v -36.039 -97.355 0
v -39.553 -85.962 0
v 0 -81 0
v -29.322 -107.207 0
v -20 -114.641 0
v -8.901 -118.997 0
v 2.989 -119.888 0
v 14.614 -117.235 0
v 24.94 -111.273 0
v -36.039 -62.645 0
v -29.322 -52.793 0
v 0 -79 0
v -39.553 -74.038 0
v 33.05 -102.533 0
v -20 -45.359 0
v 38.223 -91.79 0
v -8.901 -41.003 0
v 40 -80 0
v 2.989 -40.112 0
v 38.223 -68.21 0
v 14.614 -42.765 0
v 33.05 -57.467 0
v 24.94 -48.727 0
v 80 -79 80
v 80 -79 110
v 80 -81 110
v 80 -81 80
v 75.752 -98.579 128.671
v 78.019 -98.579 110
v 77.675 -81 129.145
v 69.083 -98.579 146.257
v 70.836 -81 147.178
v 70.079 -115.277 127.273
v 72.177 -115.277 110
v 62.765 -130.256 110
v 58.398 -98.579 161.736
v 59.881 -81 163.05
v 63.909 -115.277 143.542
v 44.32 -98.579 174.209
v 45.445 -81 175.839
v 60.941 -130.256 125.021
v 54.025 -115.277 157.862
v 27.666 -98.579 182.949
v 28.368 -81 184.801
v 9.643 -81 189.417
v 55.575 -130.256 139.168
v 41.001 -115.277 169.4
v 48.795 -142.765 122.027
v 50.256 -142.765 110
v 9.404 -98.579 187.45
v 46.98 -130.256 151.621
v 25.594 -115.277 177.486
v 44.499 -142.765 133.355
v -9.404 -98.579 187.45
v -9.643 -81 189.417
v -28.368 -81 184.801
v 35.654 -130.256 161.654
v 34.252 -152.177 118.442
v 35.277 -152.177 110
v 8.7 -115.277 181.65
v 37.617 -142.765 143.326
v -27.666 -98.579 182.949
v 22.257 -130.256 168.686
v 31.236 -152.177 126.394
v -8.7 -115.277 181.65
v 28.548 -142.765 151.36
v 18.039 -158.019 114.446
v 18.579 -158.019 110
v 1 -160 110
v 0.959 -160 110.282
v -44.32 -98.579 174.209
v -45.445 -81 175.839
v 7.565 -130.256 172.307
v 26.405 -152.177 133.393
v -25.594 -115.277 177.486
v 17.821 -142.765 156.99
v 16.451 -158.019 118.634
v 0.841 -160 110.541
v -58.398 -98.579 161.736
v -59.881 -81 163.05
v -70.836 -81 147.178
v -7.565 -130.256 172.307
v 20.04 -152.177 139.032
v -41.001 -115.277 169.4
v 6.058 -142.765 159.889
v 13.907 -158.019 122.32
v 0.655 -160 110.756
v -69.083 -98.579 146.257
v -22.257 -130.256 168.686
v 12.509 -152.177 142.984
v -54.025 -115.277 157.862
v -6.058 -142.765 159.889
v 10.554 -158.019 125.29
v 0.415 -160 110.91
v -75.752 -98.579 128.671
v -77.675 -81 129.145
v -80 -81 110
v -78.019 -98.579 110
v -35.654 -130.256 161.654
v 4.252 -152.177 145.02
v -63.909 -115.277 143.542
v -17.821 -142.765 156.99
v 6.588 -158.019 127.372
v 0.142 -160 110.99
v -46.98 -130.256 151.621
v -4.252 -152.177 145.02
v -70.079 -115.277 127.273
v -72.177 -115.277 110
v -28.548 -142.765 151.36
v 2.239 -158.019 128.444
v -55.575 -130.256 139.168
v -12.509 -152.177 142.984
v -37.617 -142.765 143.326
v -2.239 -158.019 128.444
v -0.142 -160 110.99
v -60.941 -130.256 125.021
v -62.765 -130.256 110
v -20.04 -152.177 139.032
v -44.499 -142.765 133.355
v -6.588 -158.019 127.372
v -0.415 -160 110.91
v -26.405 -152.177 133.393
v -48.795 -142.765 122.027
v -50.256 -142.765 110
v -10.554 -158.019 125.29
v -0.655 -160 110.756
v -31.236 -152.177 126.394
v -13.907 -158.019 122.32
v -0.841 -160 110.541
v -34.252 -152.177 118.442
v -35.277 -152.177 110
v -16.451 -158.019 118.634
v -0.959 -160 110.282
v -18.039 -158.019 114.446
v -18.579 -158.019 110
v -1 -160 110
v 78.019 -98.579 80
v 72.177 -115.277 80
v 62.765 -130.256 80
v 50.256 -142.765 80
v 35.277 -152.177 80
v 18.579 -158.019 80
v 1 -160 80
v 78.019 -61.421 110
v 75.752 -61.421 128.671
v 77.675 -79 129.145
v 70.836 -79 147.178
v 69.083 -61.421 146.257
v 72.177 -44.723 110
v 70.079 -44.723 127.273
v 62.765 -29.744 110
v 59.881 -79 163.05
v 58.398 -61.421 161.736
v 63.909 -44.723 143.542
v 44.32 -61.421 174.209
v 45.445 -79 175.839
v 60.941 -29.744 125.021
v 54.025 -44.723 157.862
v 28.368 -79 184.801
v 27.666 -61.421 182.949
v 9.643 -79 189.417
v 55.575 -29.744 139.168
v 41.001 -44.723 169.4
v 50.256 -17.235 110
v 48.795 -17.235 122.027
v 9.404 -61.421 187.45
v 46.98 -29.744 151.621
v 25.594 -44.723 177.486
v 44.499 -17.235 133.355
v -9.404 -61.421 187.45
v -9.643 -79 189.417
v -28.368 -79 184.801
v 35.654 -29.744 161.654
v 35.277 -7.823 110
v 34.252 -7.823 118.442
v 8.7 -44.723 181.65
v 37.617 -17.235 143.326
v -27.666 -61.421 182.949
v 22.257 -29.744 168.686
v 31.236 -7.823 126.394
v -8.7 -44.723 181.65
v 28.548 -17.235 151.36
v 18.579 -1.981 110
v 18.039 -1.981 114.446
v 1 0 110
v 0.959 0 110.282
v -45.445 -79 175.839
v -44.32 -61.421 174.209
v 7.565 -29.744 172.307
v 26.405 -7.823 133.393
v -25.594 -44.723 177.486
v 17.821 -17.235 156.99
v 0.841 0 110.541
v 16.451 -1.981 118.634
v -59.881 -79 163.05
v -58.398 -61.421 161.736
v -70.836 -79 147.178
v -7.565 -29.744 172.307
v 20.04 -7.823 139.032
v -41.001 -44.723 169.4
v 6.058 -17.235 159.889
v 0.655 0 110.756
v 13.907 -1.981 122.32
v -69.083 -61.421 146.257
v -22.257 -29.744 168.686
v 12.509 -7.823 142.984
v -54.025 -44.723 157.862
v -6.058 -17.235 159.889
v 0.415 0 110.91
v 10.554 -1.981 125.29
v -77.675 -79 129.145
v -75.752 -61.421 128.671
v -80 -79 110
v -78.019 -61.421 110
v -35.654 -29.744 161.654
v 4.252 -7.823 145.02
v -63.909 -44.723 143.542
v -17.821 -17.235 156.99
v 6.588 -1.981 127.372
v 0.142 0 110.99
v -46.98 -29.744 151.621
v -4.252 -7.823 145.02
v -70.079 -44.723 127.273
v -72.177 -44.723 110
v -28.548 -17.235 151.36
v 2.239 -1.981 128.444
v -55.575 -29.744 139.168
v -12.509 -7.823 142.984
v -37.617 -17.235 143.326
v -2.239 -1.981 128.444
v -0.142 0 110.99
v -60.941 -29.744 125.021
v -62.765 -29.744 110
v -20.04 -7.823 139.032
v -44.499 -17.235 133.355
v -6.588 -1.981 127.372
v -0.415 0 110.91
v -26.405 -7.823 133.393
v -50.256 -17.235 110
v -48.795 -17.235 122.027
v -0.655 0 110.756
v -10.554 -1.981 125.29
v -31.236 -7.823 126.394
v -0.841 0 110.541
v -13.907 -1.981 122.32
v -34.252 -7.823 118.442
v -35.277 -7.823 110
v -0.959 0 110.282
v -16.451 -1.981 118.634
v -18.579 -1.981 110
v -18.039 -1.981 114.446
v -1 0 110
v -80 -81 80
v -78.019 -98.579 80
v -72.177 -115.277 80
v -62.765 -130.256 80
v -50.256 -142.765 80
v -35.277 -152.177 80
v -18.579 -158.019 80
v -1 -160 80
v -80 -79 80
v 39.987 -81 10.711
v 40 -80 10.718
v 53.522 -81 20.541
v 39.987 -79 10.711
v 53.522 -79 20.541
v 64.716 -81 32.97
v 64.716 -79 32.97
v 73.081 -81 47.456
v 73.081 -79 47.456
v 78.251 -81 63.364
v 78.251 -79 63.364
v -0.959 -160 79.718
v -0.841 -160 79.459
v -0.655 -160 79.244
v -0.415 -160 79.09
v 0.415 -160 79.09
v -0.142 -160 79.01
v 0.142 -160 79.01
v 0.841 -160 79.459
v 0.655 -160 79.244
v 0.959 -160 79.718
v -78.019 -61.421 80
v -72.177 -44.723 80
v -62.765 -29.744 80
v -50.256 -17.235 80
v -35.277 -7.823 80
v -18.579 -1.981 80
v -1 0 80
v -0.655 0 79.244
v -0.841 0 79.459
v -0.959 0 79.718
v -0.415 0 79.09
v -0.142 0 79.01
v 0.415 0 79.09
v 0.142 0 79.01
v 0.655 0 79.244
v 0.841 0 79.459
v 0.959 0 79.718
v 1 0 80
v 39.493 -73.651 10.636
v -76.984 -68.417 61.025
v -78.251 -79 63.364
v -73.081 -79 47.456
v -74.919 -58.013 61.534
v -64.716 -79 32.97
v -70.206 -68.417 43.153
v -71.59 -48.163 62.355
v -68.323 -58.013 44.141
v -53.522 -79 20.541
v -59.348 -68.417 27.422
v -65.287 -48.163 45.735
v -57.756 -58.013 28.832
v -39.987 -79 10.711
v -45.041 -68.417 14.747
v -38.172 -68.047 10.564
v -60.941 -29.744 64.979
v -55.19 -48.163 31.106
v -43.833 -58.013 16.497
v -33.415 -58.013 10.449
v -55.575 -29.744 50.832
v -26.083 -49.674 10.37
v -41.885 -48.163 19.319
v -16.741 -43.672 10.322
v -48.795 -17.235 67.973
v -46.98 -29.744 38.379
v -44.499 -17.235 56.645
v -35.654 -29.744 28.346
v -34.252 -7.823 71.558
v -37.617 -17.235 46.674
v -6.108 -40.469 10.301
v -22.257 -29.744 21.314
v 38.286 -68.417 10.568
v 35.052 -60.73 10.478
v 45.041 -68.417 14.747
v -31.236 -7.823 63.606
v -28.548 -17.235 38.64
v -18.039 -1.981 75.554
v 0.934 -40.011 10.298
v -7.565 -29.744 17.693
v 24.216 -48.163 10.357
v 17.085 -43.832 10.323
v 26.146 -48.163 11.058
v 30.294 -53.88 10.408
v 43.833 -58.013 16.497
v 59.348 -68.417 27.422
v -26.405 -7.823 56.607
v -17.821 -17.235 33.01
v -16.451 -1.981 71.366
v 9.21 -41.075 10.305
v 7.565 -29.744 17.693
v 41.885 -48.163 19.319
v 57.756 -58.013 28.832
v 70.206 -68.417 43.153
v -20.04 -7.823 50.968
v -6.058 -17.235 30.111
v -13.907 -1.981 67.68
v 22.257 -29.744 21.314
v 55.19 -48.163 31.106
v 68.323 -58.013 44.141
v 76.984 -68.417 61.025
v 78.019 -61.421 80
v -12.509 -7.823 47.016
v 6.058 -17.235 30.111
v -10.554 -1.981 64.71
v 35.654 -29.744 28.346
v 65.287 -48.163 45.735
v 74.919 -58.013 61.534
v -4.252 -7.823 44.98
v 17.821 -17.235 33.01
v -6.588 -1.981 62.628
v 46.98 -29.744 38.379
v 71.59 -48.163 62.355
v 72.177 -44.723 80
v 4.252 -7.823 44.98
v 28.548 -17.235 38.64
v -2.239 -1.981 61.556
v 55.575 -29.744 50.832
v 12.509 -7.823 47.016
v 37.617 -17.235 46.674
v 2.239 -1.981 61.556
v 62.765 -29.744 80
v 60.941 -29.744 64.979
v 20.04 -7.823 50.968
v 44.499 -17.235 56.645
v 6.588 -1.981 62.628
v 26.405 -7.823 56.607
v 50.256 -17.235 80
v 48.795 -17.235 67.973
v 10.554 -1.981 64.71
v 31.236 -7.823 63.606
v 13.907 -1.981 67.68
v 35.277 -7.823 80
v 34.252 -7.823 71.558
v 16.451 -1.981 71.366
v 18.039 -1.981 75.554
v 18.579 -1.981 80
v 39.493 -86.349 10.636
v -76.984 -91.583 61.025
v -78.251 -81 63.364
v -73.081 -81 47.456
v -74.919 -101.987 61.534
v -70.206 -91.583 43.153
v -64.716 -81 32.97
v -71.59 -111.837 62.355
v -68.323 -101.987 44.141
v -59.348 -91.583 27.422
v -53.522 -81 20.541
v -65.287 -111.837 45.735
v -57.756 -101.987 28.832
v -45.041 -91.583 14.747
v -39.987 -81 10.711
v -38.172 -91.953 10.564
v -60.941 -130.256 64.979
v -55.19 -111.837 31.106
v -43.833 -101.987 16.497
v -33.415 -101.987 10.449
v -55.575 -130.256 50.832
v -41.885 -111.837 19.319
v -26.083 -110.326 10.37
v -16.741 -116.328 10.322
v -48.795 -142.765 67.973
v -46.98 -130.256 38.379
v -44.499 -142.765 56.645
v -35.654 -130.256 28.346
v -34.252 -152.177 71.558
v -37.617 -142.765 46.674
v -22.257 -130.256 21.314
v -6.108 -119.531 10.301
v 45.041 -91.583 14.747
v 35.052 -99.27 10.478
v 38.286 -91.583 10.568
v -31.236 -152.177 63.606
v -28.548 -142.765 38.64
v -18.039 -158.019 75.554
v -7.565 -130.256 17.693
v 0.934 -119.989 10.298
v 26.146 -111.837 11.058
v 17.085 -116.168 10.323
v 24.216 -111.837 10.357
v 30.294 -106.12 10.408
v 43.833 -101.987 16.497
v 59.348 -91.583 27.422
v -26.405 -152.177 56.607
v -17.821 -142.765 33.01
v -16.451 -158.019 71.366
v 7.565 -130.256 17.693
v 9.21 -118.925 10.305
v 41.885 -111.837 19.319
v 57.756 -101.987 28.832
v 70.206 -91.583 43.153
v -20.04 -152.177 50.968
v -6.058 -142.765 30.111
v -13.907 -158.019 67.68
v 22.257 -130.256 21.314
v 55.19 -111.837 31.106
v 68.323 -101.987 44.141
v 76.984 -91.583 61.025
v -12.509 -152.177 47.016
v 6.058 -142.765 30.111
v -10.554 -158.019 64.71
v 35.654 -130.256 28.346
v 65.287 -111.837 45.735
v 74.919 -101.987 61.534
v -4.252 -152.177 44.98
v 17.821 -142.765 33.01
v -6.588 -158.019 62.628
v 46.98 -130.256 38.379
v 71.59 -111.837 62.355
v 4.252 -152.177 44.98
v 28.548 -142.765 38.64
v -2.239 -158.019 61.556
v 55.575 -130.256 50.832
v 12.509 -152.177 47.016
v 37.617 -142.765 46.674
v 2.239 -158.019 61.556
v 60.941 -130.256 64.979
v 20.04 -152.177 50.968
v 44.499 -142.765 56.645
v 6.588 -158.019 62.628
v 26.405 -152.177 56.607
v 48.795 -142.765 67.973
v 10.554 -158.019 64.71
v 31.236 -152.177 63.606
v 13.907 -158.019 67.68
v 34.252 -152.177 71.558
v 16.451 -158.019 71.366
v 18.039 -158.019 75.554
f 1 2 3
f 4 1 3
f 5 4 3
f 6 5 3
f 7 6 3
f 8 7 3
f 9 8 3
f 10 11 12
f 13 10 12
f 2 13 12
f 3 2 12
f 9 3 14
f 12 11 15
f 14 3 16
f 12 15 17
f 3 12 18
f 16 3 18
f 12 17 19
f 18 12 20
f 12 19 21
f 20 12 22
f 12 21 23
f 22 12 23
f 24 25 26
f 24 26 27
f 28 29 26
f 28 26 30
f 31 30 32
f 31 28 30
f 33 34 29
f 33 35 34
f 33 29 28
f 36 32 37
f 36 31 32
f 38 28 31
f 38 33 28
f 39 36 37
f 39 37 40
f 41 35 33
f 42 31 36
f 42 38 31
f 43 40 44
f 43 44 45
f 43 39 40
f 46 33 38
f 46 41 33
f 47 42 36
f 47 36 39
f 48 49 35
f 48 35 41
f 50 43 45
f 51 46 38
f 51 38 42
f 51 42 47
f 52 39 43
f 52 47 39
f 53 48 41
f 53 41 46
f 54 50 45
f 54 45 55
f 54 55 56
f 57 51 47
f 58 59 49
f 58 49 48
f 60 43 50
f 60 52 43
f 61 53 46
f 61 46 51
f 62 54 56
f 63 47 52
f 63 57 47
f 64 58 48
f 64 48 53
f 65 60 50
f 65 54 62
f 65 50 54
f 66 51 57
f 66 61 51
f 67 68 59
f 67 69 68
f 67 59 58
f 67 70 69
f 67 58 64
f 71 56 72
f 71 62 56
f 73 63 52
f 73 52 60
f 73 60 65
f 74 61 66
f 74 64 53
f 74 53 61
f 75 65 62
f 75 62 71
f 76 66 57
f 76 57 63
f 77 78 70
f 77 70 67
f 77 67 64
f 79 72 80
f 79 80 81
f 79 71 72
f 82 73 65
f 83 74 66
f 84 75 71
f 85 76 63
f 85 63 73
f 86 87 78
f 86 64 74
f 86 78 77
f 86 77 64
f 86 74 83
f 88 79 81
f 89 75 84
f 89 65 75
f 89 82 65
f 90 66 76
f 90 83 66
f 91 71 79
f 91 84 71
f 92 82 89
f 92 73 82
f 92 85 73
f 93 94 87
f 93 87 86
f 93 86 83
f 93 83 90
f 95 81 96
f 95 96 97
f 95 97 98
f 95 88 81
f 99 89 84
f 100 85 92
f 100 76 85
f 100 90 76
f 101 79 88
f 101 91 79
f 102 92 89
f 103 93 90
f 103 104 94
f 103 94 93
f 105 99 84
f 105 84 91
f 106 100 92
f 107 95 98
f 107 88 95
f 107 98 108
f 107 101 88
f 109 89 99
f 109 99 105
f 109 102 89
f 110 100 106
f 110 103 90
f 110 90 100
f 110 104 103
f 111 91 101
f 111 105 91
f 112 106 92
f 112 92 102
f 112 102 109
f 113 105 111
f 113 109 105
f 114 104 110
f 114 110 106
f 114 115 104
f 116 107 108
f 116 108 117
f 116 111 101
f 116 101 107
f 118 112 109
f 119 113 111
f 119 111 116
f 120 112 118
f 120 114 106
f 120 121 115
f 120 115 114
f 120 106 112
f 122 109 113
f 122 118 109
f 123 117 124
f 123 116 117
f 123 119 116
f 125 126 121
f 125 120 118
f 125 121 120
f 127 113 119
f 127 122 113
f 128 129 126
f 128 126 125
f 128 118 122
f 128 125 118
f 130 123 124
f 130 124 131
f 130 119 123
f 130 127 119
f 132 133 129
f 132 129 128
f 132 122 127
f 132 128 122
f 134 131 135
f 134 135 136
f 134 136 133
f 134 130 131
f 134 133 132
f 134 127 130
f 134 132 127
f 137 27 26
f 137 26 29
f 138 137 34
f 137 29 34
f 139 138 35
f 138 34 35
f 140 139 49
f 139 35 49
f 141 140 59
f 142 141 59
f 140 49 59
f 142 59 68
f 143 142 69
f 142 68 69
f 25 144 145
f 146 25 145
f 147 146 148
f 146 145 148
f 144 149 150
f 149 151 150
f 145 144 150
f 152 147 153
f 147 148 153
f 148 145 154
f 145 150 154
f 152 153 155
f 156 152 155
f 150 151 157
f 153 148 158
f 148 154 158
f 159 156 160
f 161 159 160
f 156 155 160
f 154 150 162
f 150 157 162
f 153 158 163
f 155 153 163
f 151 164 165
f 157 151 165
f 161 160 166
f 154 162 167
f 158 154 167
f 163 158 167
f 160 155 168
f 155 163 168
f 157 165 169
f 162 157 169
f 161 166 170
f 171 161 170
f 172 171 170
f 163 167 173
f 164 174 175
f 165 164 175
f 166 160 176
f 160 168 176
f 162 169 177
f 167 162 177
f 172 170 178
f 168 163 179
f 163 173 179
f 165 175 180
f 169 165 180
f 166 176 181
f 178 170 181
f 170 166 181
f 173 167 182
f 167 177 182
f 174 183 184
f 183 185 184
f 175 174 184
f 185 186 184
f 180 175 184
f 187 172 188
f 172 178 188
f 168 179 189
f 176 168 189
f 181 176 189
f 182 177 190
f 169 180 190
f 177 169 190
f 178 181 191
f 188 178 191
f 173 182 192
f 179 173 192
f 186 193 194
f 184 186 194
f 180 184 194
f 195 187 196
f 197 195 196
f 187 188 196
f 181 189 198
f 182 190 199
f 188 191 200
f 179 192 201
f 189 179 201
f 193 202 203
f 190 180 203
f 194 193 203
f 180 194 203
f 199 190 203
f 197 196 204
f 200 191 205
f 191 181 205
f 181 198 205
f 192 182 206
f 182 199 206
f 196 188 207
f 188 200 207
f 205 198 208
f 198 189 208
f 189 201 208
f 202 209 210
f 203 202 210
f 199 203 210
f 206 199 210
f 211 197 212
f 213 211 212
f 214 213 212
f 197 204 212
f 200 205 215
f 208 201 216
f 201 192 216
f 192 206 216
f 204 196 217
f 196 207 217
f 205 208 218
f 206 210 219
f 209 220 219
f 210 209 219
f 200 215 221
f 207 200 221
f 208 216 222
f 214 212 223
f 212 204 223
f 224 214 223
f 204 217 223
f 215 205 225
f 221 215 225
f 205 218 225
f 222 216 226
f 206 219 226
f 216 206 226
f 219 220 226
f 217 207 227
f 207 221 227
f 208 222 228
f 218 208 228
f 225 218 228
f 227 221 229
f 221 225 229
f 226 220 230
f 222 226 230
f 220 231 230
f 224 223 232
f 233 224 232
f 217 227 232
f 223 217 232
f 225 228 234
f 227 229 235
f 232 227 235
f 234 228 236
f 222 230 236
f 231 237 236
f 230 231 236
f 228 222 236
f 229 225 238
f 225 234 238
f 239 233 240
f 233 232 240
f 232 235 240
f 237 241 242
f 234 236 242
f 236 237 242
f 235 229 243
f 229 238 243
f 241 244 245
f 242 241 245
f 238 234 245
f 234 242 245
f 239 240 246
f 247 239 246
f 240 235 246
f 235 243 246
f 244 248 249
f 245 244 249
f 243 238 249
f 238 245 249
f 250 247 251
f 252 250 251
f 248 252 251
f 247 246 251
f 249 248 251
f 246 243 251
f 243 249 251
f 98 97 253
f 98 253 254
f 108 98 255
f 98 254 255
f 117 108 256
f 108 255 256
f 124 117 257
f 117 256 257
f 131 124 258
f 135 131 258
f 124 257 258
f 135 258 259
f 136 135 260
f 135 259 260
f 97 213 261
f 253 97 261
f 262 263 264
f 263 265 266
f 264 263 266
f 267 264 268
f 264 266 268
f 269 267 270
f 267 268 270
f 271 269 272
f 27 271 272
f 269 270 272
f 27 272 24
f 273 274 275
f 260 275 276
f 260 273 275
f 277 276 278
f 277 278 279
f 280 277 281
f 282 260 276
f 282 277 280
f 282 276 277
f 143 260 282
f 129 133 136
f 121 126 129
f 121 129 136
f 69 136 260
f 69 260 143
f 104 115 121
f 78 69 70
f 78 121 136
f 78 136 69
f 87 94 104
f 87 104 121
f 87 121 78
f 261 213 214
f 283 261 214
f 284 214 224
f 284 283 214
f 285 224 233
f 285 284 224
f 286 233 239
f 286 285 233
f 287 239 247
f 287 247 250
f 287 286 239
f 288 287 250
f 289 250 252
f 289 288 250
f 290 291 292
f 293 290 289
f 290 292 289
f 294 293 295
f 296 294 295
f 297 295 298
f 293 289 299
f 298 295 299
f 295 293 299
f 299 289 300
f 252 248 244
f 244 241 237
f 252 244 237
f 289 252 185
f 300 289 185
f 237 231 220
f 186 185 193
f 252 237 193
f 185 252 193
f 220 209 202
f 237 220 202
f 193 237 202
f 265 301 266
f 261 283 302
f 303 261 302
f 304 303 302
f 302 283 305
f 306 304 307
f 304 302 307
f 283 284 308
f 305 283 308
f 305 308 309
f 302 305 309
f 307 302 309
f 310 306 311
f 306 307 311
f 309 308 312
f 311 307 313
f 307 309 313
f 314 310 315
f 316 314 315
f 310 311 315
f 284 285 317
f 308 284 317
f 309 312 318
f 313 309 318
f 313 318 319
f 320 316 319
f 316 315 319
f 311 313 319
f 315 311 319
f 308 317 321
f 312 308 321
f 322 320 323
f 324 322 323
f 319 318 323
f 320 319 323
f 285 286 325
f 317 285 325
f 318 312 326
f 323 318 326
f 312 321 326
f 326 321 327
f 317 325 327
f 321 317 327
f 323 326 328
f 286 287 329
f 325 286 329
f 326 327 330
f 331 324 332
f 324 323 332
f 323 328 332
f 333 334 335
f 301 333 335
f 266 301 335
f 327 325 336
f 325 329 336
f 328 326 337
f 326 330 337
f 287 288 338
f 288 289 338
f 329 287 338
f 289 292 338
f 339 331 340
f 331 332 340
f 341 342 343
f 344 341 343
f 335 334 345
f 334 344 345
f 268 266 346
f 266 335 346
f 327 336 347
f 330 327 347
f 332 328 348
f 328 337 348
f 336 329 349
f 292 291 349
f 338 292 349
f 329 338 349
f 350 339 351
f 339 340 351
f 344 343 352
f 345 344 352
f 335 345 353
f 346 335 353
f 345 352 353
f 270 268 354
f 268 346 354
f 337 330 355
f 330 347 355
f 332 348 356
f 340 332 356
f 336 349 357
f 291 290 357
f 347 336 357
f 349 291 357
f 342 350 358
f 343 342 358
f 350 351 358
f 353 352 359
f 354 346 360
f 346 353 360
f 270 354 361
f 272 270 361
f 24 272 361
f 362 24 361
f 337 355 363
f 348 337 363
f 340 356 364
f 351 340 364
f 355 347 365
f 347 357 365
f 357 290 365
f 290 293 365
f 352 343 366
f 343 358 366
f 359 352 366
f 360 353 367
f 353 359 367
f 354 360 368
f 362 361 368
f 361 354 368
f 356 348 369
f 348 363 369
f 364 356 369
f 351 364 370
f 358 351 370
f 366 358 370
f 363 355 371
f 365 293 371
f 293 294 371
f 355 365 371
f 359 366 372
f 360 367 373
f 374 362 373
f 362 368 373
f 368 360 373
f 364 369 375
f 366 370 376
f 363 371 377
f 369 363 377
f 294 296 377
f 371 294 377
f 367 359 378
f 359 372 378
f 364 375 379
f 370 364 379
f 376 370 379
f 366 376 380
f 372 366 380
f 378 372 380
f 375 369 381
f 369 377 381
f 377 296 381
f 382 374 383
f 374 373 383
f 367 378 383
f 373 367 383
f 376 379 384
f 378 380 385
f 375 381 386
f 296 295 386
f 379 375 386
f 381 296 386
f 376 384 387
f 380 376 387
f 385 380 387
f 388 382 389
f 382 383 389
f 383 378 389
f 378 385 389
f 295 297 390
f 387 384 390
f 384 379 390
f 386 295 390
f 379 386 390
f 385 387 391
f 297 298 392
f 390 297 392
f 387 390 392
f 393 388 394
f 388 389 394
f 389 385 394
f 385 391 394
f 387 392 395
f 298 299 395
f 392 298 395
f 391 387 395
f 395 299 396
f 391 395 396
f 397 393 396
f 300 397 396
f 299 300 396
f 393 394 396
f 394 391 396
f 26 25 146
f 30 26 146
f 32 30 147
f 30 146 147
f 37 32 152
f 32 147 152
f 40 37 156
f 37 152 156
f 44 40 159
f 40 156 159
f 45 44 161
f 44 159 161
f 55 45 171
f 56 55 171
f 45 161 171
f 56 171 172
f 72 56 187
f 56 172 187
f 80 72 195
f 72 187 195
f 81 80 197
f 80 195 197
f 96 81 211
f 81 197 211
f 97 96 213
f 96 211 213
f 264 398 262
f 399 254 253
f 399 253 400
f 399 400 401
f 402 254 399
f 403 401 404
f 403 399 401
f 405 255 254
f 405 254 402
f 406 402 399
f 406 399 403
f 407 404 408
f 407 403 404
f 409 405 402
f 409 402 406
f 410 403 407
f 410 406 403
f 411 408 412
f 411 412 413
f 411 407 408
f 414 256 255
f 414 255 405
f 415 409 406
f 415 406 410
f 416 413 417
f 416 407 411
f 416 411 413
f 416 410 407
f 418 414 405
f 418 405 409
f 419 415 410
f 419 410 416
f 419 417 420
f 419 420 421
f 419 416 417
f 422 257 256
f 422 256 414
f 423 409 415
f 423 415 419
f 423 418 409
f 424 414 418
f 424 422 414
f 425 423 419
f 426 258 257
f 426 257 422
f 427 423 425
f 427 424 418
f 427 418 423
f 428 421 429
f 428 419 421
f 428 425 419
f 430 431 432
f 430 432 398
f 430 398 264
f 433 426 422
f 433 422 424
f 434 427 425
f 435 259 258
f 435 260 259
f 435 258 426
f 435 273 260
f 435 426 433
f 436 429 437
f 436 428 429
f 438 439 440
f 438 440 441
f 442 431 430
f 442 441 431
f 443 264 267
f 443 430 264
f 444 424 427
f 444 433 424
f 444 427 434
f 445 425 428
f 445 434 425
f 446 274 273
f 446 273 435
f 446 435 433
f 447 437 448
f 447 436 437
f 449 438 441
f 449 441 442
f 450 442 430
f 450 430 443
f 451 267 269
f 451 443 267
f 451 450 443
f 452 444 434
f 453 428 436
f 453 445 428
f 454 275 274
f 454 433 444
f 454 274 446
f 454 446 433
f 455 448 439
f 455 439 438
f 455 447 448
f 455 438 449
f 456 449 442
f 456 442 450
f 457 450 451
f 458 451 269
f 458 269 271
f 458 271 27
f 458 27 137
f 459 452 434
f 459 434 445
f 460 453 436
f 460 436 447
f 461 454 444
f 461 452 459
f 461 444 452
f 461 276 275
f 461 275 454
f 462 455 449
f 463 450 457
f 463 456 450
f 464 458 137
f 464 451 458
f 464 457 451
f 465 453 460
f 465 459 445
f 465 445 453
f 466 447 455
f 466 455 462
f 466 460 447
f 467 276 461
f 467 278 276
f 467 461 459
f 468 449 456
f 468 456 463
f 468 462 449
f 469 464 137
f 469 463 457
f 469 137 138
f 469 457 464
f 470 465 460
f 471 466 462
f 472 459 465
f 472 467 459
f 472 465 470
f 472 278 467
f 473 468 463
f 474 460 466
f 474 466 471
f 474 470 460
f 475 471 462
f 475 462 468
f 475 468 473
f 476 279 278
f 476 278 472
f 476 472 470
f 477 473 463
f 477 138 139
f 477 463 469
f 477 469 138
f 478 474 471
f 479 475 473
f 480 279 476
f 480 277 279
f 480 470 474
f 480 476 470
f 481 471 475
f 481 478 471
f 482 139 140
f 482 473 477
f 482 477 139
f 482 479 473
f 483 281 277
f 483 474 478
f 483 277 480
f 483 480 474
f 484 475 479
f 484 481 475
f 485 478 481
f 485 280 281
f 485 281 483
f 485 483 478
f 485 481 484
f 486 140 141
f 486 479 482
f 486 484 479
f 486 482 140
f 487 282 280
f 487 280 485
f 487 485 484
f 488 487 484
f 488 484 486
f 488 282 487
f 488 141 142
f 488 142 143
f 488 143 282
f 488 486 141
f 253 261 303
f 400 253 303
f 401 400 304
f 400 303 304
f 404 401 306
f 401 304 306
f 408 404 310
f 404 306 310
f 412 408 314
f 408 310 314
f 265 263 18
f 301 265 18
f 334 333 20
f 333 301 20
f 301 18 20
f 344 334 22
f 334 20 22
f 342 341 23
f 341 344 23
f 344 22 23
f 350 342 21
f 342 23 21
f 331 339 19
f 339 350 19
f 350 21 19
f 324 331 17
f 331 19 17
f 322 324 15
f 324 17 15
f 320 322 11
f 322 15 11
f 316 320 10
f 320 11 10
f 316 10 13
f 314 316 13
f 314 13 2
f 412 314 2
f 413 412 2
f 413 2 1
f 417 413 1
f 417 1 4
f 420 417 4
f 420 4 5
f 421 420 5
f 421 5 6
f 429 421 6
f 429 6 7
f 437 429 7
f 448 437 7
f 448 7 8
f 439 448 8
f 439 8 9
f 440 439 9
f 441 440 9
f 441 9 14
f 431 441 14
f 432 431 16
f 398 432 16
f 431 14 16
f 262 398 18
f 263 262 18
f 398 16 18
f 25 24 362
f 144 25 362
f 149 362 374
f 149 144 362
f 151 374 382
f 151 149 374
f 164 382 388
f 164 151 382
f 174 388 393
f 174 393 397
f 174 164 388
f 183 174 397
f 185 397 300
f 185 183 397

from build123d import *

# Parameters (mm, degrees)
PAD002_DEPTH   = 160
FILLET004_R    = 79
CYLINDER_R     = 40
CYLINDER_DEPTH = 47.5


with BuildPart() as part:
    # Sketch010 → Pad002 (new body)
    with BuildSketch(Plane.XZ):
        with BuildLine():
            ThreePointArc((80, 110), (0, 190), (-80, 110))
            Line((-80, 110), (-80, 80))
            ThreePointArc((-80, 80), (0, 0), (80, 80))
            Line((80, 110), (80, 80))
        make_face()
    extrude(amount=PAD002_DEPTH)

    # Fillet004
    fillet004_edges = [part.edges().sort_by_distance(p)[0] for p in [
        (0, 0, 190),
        (-80, 0, 95),
        (0, 0, 0),
        (80, 0, 95),
        (0, -160, 190),
        (-80, -160, 95),
        (0, -160, 0),
        (80, -160, 95),
    ]]
    fillet(fillet004_edges, radius=FILLET004_R)

    # Cylinder → Cylinder (join)
    with BuildSketch(Plane(origin=(0, -80, 0), x_dir=(1, 0, 0), z_dir=(0, 0, 1))):
        Circle(CYLINDER_R)
    extrude(amount=CYLINDER_DEPTH)


solid = part.part
